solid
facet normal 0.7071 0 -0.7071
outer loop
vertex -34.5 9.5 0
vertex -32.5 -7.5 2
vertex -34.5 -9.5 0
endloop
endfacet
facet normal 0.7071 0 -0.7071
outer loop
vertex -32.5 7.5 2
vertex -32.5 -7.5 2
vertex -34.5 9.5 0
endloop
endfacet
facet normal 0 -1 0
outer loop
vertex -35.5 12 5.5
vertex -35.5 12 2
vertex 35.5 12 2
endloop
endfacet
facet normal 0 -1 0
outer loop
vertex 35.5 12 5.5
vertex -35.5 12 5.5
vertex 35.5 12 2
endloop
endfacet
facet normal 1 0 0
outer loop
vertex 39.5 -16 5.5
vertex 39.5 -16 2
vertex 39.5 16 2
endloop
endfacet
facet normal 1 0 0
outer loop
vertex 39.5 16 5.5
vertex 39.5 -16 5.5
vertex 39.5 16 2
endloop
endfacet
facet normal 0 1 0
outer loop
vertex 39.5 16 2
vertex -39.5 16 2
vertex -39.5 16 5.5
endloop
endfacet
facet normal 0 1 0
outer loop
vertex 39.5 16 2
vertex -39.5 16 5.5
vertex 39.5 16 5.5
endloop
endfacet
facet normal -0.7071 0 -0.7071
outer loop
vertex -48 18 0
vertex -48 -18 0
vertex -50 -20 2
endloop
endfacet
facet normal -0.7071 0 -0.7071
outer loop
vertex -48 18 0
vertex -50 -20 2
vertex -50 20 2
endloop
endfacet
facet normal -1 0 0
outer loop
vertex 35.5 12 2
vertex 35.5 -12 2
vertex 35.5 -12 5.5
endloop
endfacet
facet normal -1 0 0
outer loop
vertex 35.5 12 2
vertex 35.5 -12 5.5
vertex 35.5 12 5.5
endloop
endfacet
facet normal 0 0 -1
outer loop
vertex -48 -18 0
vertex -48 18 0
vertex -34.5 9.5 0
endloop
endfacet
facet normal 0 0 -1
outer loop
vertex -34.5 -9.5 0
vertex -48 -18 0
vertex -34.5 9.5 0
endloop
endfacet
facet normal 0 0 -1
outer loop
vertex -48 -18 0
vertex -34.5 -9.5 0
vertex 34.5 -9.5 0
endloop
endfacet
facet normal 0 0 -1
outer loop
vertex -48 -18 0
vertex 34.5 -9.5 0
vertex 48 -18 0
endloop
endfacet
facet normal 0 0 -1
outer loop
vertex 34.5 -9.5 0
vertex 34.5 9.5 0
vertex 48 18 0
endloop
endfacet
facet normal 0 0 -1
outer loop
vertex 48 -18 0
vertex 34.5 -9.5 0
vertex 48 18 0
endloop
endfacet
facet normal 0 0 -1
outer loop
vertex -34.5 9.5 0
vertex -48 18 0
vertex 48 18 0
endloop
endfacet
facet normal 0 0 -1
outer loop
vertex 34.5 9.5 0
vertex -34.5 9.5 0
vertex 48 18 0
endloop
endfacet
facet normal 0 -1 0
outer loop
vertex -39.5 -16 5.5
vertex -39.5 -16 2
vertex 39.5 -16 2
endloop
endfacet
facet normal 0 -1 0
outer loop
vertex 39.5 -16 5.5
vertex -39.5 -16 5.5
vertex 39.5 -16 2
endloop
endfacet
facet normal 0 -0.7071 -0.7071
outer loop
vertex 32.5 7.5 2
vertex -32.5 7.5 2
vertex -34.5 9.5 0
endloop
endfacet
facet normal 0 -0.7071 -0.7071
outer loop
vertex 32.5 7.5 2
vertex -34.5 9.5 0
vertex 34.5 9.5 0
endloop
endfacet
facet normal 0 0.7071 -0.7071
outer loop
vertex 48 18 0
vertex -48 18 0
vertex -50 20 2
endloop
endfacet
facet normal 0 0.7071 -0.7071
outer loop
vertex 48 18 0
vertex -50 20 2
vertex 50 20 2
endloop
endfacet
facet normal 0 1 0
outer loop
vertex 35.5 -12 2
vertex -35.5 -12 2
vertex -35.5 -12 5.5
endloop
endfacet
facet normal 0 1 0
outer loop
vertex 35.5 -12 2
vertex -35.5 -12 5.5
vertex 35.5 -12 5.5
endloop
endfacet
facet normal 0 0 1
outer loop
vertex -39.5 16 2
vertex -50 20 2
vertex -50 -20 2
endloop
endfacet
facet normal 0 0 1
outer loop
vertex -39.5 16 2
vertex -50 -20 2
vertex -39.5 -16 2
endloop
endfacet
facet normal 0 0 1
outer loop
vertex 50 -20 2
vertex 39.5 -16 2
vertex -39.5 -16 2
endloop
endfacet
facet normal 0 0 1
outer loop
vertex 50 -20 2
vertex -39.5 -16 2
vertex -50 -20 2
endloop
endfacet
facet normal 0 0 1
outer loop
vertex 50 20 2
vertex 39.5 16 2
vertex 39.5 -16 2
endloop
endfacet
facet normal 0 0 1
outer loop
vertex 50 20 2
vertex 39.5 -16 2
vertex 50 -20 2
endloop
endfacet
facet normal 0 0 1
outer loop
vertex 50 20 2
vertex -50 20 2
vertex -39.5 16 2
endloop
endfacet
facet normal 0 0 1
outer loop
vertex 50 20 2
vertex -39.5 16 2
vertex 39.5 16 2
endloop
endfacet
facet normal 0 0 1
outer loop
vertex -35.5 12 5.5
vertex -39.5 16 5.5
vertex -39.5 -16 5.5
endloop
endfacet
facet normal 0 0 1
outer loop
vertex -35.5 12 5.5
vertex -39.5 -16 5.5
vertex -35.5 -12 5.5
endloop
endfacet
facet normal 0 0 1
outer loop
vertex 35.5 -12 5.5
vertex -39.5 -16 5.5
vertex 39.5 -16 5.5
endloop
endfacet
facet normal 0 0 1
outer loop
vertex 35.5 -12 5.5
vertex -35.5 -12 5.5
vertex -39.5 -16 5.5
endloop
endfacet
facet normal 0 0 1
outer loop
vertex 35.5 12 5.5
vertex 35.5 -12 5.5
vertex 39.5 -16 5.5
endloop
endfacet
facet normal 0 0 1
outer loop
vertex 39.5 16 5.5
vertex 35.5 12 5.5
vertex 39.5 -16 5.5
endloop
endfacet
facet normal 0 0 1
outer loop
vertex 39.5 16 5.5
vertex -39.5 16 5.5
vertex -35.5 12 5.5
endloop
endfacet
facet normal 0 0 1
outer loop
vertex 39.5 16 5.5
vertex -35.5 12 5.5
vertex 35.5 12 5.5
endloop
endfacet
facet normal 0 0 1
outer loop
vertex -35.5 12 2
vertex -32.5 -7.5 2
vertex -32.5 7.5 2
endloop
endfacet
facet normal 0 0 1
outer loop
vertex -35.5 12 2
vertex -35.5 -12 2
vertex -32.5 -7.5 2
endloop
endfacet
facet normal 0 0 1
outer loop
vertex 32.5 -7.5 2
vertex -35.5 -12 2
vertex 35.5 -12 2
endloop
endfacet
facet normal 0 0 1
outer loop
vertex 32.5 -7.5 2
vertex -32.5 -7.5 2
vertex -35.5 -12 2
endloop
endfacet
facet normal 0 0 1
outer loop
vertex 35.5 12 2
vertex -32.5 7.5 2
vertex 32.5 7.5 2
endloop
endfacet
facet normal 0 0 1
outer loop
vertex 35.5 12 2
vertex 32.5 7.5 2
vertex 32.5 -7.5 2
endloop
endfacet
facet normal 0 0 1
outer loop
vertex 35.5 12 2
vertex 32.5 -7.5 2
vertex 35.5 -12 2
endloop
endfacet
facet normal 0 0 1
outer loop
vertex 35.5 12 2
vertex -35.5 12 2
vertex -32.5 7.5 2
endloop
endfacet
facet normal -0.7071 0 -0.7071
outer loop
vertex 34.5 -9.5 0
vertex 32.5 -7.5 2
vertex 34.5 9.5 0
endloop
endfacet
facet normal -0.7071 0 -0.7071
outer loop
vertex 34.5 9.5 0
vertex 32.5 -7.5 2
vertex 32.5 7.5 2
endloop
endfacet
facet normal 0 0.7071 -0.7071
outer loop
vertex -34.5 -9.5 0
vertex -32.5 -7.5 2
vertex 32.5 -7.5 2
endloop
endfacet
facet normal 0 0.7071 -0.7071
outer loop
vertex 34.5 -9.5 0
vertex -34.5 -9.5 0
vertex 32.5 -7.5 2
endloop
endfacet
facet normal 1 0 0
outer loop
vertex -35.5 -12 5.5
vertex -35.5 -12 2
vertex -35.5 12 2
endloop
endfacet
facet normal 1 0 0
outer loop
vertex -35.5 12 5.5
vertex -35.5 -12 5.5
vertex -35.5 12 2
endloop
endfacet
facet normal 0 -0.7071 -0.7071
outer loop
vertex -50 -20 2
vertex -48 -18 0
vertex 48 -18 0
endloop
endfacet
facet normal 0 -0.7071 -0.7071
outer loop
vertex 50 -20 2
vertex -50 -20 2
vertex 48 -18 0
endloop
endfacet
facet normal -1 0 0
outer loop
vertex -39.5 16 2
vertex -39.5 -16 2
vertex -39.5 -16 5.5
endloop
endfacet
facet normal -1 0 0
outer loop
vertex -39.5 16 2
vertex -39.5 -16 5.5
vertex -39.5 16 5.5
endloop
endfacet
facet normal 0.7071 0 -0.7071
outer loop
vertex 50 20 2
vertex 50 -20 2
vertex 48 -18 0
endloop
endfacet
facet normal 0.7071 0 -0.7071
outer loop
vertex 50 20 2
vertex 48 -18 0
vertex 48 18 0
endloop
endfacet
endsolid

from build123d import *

# Parameters (mm, degrees)
F0_W     = 100
F0_H     = 40
F1_DEPTH = 2
F2_W     = 79
F2_H     = 32
F2_W_2   = 71
F2_H_2   = 24
F3_DEPTH = 3.5
F4_W     = 65
F4_H     = 15
F5_DEPTH = 2
F6_SIZE  = 1.99999


# Not quite as in the source:
# - a fillet or chamfer is up to 0.001 mm smaller than in the source, because OpenCascade refuses the exact size


with BuildPart() as f1:
    # F0 (on Top) → F1 (new body)
    with BuildSketch(Plane.XY):
        Rectangle(F0_W, F0_H)
    extrude(amount=F1_DEPTH)

    # F2 (on face) → F3 (join)
    with BuildSketch(Plane.XY.offset(2)):
        Rectangle(F2_W, F2_H)
        Rectangle(F2_W_2, F2_H_2, mode=Mode.SUBTRACT)
    extrude(amount=F3_DEPTH)

    # F4 (on face) → F5 (cut, through all)
    with BuildSketch(Plane.XY.offset(2)):
        Rectangle(F4_W, F4_H)
    extrude(amount=-F5_DEPTH, mode=Mode.SUBTRACT)

    # F6 (size 2 in the source; OpenCascade refuses exactly that, so slightly less here)
    f6_edges = [f1.edges().sort_by_distance(p)[0] for p in [
        (32.5, 0, 0),
        (0, 7.5, 0),
        (-32.5, 0, 0),
        (0, -7.5, 0),
        (0, 20, 0),
        (50, 0, 0),
        (0, -20, 0),
        (-50, 0, 0),
    ]]
    chamfer(f6_edges, length=F6_SIZE)


solid = f1.part
